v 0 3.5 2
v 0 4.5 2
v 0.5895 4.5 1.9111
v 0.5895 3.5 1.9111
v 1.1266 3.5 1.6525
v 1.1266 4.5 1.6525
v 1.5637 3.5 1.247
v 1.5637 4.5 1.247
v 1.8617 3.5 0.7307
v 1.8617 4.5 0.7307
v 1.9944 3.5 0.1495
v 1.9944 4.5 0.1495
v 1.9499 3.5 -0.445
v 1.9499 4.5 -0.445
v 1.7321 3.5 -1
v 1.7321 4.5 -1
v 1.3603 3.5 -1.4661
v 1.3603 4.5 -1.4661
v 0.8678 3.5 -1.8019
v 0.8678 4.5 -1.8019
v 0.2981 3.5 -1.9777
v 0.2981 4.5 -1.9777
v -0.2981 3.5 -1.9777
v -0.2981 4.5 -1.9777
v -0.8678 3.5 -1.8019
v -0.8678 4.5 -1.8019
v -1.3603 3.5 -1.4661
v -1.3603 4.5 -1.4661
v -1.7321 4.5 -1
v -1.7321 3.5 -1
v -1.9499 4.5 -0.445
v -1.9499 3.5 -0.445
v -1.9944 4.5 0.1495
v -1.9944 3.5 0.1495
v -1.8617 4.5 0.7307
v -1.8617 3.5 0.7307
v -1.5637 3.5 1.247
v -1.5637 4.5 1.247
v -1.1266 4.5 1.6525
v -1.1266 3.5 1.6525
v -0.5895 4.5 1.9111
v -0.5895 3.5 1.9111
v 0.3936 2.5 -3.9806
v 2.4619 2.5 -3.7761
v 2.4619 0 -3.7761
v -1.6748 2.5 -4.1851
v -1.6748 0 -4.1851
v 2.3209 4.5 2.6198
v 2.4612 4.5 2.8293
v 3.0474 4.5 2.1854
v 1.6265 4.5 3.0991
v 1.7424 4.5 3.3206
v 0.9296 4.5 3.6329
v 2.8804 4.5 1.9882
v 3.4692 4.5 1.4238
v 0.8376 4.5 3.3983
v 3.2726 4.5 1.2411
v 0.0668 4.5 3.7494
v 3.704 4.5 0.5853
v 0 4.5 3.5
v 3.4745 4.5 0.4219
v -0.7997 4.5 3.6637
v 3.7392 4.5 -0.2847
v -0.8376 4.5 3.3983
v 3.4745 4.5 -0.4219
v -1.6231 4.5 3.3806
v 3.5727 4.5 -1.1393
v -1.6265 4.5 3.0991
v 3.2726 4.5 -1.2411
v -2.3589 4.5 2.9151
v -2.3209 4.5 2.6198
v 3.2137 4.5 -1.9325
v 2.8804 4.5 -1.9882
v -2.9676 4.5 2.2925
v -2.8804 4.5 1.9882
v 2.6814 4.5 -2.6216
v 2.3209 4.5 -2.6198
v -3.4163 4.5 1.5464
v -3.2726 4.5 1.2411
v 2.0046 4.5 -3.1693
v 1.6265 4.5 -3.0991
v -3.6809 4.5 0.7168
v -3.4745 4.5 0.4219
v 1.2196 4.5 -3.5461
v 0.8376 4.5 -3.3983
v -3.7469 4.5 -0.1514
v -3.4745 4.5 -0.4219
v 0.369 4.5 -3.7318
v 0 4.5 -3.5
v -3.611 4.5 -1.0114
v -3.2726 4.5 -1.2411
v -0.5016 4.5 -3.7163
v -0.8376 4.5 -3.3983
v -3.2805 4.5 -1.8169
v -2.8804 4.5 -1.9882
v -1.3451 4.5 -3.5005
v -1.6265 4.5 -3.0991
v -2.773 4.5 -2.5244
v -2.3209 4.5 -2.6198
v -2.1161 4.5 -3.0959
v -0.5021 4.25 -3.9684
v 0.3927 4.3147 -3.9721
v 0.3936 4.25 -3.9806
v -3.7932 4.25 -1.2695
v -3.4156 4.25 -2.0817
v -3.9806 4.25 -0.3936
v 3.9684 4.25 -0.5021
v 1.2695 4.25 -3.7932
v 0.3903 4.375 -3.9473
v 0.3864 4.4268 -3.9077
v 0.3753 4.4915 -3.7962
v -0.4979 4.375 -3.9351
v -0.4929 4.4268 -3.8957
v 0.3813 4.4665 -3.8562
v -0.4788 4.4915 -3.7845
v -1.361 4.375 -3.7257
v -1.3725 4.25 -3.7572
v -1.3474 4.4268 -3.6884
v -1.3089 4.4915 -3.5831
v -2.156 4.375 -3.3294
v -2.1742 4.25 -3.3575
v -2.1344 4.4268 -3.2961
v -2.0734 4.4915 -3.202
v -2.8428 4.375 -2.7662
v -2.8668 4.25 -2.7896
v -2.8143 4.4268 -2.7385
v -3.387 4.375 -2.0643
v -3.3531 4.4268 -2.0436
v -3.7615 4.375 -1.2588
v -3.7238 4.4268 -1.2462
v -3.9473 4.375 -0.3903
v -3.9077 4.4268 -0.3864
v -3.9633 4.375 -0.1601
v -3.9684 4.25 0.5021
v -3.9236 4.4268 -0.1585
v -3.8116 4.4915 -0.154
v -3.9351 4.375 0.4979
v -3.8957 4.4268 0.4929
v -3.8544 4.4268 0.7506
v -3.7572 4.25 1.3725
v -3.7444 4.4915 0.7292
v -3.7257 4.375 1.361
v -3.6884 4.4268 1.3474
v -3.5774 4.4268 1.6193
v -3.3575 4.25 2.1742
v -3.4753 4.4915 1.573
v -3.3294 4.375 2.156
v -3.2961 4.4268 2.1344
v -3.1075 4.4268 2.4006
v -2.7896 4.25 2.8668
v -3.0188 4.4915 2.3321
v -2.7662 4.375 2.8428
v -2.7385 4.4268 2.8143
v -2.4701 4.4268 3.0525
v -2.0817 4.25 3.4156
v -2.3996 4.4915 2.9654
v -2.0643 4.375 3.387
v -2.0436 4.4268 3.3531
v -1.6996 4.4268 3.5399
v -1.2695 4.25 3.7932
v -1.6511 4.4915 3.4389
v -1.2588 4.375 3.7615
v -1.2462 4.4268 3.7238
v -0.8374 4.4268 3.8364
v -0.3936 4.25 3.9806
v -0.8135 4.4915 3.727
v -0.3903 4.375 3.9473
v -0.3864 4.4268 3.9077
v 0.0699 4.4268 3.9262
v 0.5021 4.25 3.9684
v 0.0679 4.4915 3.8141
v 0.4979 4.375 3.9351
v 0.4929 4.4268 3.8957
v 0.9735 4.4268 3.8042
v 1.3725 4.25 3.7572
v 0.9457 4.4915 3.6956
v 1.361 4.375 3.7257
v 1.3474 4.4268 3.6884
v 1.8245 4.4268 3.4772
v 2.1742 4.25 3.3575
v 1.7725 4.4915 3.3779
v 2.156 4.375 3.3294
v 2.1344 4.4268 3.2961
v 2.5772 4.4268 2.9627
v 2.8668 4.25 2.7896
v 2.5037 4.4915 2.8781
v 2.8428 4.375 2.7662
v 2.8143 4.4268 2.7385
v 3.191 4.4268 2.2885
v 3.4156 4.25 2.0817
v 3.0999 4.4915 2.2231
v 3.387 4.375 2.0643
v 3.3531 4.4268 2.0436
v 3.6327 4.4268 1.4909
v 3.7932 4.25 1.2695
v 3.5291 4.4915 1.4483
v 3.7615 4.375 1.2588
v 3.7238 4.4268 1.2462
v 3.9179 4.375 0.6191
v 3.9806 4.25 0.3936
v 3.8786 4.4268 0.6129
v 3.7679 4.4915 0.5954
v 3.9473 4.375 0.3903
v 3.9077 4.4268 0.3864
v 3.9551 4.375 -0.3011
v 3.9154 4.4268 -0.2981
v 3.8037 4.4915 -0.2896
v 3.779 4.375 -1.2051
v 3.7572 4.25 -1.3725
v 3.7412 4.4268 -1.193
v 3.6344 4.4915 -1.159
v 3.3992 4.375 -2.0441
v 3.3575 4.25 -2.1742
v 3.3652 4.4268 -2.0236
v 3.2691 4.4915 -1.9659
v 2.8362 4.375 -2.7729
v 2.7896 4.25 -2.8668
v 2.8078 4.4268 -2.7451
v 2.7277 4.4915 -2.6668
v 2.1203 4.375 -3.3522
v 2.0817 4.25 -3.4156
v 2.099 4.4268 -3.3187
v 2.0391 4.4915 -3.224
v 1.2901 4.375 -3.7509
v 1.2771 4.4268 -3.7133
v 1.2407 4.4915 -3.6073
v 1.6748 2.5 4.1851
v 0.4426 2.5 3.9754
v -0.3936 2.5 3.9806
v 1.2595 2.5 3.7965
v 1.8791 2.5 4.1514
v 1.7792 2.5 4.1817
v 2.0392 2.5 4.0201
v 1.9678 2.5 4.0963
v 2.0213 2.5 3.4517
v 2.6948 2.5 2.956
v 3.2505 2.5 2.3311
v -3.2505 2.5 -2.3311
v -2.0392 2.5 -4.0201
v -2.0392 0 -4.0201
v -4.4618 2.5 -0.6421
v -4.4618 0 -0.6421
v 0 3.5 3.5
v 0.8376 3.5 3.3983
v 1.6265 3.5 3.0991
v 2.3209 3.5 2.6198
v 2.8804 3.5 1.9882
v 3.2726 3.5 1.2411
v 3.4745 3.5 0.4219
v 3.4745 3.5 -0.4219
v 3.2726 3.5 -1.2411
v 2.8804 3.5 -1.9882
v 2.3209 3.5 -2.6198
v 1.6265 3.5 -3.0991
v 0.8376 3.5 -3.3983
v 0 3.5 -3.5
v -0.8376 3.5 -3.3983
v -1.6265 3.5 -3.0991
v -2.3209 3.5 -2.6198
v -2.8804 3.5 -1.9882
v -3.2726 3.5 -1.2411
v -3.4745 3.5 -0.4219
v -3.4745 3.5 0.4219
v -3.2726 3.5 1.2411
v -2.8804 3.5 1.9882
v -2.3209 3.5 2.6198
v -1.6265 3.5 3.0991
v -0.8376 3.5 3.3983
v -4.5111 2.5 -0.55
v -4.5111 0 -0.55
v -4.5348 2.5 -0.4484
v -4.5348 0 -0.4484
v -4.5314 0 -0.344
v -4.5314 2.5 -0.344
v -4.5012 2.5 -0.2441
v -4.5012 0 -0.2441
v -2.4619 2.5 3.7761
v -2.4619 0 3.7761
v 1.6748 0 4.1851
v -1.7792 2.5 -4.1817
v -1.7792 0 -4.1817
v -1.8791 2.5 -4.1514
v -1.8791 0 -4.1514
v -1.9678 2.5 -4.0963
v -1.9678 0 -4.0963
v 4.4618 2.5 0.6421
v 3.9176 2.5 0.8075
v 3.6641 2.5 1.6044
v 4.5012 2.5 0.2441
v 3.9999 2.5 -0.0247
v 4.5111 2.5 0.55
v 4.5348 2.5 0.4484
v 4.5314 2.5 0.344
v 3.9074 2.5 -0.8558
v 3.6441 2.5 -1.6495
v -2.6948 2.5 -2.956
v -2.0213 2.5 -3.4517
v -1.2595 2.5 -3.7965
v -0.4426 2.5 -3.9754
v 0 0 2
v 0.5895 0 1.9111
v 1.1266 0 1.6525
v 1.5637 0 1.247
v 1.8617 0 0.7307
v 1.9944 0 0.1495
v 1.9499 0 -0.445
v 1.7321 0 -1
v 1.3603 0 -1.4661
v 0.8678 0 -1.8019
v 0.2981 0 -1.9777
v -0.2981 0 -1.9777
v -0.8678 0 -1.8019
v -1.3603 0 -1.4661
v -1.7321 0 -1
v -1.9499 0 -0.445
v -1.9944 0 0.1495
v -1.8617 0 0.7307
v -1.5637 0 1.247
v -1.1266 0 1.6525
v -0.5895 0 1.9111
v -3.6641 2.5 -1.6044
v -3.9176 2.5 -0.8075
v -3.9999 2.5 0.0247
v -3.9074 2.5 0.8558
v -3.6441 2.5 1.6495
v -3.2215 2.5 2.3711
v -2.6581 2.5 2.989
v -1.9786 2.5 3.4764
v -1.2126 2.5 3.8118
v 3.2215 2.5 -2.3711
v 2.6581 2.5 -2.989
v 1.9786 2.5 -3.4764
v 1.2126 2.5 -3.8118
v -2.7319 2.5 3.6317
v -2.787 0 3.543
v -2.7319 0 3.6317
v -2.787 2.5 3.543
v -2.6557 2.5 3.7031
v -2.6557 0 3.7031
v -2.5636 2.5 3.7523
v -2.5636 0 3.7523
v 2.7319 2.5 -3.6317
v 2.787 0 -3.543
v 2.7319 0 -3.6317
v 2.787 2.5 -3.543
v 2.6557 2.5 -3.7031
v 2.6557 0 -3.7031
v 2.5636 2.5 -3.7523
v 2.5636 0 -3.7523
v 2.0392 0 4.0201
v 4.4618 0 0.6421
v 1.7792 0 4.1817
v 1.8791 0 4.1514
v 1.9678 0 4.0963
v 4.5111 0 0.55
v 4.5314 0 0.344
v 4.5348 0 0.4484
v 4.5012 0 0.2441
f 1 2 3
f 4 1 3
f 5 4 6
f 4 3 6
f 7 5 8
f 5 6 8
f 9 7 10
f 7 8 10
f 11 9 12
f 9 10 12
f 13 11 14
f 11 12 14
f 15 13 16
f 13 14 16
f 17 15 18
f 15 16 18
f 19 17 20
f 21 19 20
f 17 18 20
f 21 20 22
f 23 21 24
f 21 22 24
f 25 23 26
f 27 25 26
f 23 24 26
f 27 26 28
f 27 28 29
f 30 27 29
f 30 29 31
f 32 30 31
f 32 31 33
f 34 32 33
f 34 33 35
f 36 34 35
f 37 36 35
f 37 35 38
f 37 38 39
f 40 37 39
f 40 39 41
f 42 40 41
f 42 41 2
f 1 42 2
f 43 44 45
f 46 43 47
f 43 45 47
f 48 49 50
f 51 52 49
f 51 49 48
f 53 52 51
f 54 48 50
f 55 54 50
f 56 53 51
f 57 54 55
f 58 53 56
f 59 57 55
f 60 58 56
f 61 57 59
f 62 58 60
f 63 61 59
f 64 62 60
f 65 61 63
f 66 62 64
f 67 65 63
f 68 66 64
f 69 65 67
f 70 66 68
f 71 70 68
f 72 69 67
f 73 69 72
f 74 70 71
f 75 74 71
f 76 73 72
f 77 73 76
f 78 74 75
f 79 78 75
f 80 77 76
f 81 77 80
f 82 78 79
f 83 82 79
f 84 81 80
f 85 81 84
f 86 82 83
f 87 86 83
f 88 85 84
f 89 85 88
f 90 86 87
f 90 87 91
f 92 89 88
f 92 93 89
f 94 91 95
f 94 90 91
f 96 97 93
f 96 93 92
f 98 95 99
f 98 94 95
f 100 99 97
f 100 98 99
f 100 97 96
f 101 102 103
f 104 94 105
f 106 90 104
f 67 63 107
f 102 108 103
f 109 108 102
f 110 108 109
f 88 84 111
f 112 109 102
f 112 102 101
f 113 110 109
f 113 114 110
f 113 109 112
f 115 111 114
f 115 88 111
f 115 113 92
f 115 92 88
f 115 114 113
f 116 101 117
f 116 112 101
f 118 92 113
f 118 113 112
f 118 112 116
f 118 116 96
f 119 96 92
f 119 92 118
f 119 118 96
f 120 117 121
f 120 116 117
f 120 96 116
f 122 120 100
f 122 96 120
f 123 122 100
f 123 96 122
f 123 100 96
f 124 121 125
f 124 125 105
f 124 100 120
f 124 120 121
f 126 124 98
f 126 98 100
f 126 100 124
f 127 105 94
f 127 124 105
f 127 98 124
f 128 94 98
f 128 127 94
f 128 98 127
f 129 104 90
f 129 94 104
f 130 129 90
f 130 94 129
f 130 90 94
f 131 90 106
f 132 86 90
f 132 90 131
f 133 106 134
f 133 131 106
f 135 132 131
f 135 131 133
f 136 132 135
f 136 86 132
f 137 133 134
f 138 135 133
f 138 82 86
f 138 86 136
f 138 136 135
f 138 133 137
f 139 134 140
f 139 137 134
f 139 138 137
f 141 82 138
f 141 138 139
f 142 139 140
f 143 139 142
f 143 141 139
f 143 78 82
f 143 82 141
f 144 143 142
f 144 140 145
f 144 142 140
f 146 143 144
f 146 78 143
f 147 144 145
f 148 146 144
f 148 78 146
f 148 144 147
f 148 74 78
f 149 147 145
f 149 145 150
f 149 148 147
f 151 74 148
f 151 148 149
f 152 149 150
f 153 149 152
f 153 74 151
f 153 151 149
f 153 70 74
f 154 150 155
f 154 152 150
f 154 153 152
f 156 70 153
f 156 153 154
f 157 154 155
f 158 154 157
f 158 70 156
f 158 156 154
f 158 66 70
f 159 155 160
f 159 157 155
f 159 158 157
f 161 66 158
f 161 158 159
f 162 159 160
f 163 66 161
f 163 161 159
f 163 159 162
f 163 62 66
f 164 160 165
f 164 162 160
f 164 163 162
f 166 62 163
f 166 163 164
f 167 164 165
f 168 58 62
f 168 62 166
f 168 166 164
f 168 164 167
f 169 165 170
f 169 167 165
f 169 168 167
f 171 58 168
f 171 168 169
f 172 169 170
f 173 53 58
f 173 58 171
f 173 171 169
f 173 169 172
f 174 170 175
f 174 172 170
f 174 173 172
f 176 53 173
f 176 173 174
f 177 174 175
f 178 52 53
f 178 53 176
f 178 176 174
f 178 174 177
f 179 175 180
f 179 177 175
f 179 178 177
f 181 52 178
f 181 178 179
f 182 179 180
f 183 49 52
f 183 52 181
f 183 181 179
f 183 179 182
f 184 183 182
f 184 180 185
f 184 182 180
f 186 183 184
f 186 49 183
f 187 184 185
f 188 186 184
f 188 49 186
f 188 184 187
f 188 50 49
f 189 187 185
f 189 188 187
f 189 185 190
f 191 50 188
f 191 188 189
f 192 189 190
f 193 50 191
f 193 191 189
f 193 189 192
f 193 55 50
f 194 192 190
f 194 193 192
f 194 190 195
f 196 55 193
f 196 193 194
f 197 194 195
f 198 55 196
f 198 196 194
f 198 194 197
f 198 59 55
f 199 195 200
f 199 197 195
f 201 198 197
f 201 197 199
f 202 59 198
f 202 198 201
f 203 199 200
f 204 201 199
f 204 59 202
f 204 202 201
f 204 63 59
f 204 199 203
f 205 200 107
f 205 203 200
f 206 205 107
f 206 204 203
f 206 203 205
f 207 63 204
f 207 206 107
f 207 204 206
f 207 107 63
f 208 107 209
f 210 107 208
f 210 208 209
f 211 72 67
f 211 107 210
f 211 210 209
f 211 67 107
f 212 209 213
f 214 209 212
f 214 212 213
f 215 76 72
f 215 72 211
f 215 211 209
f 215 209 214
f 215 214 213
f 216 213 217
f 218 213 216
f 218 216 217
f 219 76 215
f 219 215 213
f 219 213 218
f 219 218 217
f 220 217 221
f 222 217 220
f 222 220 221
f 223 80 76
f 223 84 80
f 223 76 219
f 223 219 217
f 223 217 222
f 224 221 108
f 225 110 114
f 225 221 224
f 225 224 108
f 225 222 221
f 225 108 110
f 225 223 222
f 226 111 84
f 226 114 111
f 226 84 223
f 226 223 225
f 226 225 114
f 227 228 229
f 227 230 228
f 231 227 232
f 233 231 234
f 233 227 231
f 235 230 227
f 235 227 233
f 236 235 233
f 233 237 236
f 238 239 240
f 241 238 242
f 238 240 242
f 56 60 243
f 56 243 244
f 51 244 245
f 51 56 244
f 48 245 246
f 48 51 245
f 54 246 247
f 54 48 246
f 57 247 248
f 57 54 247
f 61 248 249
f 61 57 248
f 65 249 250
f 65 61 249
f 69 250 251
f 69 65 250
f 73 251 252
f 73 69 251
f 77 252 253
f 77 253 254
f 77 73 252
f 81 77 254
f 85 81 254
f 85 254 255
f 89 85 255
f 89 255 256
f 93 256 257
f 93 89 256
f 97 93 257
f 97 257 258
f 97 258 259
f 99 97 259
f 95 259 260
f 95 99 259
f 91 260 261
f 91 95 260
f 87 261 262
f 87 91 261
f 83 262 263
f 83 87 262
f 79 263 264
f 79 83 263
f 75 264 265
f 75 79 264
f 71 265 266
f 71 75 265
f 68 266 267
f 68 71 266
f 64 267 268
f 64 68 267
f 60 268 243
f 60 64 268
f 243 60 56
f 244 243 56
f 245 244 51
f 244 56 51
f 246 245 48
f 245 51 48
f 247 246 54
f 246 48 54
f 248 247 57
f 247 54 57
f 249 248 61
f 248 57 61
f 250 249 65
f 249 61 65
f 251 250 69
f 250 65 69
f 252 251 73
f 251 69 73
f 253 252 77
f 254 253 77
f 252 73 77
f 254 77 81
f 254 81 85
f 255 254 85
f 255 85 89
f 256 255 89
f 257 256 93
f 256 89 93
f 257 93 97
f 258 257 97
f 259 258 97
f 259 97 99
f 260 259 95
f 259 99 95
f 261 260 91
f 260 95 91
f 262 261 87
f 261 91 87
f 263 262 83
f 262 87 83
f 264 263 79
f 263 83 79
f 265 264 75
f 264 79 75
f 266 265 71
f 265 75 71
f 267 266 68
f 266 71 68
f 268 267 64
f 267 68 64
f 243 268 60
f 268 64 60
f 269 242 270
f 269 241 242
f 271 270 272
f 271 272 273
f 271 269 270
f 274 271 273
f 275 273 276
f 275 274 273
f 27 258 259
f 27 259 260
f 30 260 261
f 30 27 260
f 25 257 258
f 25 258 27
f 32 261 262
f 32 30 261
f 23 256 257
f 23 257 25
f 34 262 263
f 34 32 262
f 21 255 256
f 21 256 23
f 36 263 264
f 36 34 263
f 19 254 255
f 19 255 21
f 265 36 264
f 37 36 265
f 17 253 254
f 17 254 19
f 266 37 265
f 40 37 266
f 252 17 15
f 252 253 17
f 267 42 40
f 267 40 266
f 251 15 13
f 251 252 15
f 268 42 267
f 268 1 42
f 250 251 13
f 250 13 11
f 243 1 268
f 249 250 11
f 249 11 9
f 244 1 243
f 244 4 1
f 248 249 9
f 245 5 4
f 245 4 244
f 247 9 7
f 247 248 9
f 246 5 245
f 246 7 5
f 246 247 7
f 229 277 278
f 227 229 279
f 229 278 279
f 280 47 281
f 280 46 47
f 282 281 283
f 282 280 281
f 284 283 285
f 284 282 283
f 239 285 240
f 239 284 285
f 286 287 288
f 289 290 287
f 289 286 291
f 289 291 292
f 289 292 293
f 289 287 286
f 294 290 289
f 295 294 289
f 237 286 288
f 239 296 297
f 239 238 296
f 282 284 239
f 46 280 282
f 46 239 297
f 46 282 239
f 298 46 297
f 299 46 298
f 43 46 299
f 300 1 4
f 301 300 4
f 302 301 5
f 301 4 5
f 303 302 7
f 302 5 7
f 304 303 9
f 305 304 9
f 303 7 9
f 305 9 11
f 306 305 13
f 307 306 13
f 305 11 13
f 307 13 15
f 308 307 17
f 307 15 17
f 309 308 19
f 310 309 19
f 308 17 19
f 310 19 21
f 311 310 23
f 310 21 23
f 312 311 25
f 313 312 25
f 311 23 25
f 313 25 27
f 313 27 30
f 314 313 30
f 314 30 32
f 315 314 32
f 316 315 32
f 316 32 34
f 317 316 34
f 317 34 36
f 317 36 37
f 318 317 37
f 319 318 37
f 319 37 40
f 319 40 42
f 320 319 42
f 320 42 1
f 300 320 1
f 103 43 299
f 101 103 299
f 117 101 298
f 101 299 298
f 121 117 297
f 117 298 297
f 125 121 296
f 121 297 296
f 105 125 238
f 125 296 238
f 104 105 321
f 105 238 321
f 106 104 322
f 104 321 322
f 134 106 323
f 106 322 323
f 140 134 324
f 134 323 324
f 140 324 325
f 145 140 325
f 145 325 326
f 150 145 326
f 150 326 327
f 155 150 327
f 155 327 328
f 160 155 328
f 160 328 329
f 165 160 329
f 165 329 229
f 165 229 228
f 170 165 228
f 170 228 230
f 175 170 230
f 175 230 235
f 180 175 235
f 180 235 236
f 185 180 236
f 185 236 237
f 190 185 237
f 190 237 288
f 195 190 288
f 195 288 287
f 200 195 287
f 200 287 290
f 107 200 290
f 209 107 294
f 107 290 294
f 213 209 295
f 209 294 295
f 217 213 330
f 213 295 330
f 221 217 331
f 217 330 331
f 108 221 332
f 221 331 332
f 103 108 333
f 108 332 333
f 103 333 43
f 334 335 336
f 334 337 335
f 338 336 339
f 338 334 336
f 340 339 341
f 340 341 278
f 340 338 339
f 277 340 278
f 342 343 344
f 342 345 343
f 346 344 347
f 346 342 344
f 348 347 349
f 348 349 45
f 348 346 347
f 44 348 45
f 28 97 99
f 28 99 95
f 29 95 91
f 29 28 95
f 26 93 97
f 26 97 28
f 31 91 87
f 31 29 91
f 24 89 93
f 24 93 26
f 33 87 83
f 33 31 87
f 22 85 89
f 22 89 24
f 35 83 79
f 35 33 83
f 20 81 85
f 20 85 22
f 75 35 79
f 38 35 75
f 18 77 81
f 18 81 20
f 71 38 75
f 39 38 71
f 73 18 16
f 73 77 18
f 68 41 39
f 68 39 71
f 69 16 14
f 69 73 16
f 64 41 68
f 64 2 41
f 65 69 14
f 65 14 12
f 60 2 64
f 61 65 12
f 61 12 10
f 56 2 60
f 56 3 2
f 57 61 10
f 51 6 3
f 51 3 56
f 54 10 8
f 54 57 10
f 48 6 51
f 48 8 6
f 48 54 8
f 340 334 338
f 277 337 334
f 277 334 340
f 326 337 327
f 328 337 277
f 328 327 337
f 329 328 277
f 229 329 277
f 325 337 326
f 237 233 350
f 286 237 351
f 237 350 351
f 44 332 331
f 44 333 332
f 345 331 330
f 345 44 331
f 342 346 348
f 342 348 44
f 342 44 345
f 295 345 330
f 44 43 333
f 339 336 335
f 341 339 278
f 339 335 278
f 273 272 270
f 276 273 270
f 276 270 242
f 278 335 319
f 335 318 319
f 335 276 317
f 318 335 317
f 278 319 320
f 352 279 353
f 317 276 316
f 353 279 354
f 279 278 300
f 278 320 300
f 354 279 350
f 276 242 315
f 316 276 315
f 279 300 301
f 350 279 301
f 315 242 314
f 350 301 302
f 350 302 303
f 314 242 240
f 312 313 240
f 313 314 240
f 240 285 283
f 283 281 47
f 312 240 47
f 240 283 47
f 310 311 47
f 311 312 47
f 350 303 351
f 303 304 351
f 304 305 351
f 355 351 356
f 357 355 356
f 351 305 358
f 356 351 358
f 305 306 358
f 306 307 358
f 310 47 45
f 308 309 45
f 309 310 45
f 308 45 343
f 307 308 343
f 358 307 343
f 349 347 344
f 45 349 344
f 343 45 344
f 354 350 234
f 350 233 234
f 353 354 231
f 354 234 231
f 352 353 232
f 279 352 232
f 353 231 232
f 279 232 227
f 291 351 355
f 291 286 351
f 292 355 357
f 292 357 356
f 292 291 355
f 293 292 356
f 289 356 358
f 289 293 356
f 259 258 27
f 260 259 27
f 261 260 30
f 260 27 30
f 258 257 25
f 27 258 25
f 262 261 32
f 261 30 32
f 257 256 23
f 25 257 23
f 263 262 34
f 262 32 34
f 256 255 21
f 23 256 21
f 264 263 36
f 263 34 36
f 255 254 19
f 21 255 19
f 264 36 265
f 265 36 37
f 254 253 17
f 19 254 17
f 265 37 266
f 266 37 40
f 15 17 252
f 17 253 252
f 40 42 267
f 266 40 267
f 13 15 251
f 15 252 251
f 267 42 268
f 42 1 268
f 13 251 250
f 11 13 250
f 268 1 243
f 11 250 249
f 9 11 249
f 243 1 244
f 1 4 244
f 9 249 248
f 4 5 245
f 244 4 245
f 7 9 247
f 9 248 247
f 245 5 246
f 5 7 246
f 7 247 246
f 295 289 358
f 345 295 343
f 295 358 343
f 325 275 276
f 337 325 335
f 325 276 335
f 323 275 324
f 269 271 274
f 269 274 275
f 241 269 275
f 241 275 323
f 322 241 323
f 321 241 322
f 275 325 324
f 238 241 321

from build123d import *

# Parameters (mm, degrees)
BOSS_EXTRUDE1_DEPTH = 2.5
FILLET1_R           = 0.4
SKETCH2_R           = 4
BOSS_EXTRUDE2_DEPTH = 2
FILLET2_R           = 0.25
SKETCH5_R           = 3.5
SKETCH5_R_2         = 1.25
CUT_EXTRUDE2_DEPTH  = 1
BOSS_EXTRUDE6_START = 1
SKETCH6_R           = 3.5
BOSS_EXTRUDE6_DEPTH = 1
SKETCH7_R           = 2
CUT_EXTRUDE3_DEPTH  = 8.639592547


with BuildPart() as part:
    # Sketch1 → Boss-Extrude1 (new body)
    with BuildSketch(Plane(origin=(0, 0, 0), x_dir=(1, 0, 0), z_dir=(0, 1, 0))):
        Polygon((1.904630432, -4.20781609), (4.596390845, -0.454449706), (2.691760413, 3.753366384), (-1.904630432, 4.20781609), (-4.596390845, 0.454449706), (-2.691760413, -3.753366384), align=None)
    extrude(amount=BOSS_EXTRUDE1_DEPTH)

    # Fillet1
    fillet1_edges = [part.edges().sort_by_distance(p)[0] for p in [
        (-4.596390845, 1.25, -0.454449706),
        (-1.904630432, 1.25, -4.20781609),
        (2.691760413, 1.25, -3.753366384),
        (4.596390845, 1.25, 0.454449706),
        (1.904630432, 1.25, 4.20781609),
        (-2.691760413, 1.25, 3.753366384),
    ]]
    fillet(fillet1_edges, radius=FILLET1_R)

    # Sketch2 → Boss-Extrude2 (add)
    with BuildSketch(Plane(origin=(0, 2.5, 0), x_dir=(1, 0, 0), z_dir=(0, 1, 0))):
        Circle(SKETCH2_R)
    extrude(amount=BOSS_EXTRUDE2_DEPTH)

    # Fillet2
    fillet2_edges = [part.edges().sort_by_distance(p)[0] for p in [
        (-4, 4.5, 0),
    ]]
    fillet(fillet2_edges, radius=FILLET2_R)

    # Sketch5 → Cut-Extrude2 (cut)
    with BuildSketch(Plane(origin=(0, 4.5, 0), x_dir=(1, 0, 0), z_dir=(0, 1, 0))):
        Circle(SKETCH5_R)
        Circle(SKETCH5_R_2, mode=Mode.SUBTRACT)
    extrude(amount=-CUT_EXTRUDE2_DEPTH, mode=Mode.SUBTRACT)


with BuildPart() as body_2:
    # Sketch6 → Boss-Extrude6 (new body)
    with BuildSketch(Plane(origin=(0, 3.5, 0), x_dir=(1, 0, 0), z_dir=(0, 1, 0)).offset(BOSS_EXTRUDE6_START)):
        Circle(SKETCH6_R)
    extrude(amount=-BOSS_EXTRUDE6_DEPTH)


with BuildPart() as cut_extrude3_tool:
    # Sketch7 → Cut-Extrude3 (new, through all)
    with BuildSketch(Plane(origin=(0, 4.5, 0), x_dir=(1, 0, 0), z_dir=(0, 1, 0))):
        Circle(SKETCH7_R)
    extrude(amount=-CUT_EXTRUDE3_DEPTH)


with BuildPart() as part_1:
    add(part.part)

    # Cut-Extrude3: cut by cut_extrude3_tool
    add(cut_extrude3_tool.part, mode=Mode.SUBTRACT)


with BuildPart() as body_2_1:
    add(body_2.part)

    # Cut-Extrude3: cut by cut_extrude3_tool
    add(cut_extrude3_tool.part, mode=Mode.SUBTRACT)


solid = Compound([part_1.part, body_2_1.part])
